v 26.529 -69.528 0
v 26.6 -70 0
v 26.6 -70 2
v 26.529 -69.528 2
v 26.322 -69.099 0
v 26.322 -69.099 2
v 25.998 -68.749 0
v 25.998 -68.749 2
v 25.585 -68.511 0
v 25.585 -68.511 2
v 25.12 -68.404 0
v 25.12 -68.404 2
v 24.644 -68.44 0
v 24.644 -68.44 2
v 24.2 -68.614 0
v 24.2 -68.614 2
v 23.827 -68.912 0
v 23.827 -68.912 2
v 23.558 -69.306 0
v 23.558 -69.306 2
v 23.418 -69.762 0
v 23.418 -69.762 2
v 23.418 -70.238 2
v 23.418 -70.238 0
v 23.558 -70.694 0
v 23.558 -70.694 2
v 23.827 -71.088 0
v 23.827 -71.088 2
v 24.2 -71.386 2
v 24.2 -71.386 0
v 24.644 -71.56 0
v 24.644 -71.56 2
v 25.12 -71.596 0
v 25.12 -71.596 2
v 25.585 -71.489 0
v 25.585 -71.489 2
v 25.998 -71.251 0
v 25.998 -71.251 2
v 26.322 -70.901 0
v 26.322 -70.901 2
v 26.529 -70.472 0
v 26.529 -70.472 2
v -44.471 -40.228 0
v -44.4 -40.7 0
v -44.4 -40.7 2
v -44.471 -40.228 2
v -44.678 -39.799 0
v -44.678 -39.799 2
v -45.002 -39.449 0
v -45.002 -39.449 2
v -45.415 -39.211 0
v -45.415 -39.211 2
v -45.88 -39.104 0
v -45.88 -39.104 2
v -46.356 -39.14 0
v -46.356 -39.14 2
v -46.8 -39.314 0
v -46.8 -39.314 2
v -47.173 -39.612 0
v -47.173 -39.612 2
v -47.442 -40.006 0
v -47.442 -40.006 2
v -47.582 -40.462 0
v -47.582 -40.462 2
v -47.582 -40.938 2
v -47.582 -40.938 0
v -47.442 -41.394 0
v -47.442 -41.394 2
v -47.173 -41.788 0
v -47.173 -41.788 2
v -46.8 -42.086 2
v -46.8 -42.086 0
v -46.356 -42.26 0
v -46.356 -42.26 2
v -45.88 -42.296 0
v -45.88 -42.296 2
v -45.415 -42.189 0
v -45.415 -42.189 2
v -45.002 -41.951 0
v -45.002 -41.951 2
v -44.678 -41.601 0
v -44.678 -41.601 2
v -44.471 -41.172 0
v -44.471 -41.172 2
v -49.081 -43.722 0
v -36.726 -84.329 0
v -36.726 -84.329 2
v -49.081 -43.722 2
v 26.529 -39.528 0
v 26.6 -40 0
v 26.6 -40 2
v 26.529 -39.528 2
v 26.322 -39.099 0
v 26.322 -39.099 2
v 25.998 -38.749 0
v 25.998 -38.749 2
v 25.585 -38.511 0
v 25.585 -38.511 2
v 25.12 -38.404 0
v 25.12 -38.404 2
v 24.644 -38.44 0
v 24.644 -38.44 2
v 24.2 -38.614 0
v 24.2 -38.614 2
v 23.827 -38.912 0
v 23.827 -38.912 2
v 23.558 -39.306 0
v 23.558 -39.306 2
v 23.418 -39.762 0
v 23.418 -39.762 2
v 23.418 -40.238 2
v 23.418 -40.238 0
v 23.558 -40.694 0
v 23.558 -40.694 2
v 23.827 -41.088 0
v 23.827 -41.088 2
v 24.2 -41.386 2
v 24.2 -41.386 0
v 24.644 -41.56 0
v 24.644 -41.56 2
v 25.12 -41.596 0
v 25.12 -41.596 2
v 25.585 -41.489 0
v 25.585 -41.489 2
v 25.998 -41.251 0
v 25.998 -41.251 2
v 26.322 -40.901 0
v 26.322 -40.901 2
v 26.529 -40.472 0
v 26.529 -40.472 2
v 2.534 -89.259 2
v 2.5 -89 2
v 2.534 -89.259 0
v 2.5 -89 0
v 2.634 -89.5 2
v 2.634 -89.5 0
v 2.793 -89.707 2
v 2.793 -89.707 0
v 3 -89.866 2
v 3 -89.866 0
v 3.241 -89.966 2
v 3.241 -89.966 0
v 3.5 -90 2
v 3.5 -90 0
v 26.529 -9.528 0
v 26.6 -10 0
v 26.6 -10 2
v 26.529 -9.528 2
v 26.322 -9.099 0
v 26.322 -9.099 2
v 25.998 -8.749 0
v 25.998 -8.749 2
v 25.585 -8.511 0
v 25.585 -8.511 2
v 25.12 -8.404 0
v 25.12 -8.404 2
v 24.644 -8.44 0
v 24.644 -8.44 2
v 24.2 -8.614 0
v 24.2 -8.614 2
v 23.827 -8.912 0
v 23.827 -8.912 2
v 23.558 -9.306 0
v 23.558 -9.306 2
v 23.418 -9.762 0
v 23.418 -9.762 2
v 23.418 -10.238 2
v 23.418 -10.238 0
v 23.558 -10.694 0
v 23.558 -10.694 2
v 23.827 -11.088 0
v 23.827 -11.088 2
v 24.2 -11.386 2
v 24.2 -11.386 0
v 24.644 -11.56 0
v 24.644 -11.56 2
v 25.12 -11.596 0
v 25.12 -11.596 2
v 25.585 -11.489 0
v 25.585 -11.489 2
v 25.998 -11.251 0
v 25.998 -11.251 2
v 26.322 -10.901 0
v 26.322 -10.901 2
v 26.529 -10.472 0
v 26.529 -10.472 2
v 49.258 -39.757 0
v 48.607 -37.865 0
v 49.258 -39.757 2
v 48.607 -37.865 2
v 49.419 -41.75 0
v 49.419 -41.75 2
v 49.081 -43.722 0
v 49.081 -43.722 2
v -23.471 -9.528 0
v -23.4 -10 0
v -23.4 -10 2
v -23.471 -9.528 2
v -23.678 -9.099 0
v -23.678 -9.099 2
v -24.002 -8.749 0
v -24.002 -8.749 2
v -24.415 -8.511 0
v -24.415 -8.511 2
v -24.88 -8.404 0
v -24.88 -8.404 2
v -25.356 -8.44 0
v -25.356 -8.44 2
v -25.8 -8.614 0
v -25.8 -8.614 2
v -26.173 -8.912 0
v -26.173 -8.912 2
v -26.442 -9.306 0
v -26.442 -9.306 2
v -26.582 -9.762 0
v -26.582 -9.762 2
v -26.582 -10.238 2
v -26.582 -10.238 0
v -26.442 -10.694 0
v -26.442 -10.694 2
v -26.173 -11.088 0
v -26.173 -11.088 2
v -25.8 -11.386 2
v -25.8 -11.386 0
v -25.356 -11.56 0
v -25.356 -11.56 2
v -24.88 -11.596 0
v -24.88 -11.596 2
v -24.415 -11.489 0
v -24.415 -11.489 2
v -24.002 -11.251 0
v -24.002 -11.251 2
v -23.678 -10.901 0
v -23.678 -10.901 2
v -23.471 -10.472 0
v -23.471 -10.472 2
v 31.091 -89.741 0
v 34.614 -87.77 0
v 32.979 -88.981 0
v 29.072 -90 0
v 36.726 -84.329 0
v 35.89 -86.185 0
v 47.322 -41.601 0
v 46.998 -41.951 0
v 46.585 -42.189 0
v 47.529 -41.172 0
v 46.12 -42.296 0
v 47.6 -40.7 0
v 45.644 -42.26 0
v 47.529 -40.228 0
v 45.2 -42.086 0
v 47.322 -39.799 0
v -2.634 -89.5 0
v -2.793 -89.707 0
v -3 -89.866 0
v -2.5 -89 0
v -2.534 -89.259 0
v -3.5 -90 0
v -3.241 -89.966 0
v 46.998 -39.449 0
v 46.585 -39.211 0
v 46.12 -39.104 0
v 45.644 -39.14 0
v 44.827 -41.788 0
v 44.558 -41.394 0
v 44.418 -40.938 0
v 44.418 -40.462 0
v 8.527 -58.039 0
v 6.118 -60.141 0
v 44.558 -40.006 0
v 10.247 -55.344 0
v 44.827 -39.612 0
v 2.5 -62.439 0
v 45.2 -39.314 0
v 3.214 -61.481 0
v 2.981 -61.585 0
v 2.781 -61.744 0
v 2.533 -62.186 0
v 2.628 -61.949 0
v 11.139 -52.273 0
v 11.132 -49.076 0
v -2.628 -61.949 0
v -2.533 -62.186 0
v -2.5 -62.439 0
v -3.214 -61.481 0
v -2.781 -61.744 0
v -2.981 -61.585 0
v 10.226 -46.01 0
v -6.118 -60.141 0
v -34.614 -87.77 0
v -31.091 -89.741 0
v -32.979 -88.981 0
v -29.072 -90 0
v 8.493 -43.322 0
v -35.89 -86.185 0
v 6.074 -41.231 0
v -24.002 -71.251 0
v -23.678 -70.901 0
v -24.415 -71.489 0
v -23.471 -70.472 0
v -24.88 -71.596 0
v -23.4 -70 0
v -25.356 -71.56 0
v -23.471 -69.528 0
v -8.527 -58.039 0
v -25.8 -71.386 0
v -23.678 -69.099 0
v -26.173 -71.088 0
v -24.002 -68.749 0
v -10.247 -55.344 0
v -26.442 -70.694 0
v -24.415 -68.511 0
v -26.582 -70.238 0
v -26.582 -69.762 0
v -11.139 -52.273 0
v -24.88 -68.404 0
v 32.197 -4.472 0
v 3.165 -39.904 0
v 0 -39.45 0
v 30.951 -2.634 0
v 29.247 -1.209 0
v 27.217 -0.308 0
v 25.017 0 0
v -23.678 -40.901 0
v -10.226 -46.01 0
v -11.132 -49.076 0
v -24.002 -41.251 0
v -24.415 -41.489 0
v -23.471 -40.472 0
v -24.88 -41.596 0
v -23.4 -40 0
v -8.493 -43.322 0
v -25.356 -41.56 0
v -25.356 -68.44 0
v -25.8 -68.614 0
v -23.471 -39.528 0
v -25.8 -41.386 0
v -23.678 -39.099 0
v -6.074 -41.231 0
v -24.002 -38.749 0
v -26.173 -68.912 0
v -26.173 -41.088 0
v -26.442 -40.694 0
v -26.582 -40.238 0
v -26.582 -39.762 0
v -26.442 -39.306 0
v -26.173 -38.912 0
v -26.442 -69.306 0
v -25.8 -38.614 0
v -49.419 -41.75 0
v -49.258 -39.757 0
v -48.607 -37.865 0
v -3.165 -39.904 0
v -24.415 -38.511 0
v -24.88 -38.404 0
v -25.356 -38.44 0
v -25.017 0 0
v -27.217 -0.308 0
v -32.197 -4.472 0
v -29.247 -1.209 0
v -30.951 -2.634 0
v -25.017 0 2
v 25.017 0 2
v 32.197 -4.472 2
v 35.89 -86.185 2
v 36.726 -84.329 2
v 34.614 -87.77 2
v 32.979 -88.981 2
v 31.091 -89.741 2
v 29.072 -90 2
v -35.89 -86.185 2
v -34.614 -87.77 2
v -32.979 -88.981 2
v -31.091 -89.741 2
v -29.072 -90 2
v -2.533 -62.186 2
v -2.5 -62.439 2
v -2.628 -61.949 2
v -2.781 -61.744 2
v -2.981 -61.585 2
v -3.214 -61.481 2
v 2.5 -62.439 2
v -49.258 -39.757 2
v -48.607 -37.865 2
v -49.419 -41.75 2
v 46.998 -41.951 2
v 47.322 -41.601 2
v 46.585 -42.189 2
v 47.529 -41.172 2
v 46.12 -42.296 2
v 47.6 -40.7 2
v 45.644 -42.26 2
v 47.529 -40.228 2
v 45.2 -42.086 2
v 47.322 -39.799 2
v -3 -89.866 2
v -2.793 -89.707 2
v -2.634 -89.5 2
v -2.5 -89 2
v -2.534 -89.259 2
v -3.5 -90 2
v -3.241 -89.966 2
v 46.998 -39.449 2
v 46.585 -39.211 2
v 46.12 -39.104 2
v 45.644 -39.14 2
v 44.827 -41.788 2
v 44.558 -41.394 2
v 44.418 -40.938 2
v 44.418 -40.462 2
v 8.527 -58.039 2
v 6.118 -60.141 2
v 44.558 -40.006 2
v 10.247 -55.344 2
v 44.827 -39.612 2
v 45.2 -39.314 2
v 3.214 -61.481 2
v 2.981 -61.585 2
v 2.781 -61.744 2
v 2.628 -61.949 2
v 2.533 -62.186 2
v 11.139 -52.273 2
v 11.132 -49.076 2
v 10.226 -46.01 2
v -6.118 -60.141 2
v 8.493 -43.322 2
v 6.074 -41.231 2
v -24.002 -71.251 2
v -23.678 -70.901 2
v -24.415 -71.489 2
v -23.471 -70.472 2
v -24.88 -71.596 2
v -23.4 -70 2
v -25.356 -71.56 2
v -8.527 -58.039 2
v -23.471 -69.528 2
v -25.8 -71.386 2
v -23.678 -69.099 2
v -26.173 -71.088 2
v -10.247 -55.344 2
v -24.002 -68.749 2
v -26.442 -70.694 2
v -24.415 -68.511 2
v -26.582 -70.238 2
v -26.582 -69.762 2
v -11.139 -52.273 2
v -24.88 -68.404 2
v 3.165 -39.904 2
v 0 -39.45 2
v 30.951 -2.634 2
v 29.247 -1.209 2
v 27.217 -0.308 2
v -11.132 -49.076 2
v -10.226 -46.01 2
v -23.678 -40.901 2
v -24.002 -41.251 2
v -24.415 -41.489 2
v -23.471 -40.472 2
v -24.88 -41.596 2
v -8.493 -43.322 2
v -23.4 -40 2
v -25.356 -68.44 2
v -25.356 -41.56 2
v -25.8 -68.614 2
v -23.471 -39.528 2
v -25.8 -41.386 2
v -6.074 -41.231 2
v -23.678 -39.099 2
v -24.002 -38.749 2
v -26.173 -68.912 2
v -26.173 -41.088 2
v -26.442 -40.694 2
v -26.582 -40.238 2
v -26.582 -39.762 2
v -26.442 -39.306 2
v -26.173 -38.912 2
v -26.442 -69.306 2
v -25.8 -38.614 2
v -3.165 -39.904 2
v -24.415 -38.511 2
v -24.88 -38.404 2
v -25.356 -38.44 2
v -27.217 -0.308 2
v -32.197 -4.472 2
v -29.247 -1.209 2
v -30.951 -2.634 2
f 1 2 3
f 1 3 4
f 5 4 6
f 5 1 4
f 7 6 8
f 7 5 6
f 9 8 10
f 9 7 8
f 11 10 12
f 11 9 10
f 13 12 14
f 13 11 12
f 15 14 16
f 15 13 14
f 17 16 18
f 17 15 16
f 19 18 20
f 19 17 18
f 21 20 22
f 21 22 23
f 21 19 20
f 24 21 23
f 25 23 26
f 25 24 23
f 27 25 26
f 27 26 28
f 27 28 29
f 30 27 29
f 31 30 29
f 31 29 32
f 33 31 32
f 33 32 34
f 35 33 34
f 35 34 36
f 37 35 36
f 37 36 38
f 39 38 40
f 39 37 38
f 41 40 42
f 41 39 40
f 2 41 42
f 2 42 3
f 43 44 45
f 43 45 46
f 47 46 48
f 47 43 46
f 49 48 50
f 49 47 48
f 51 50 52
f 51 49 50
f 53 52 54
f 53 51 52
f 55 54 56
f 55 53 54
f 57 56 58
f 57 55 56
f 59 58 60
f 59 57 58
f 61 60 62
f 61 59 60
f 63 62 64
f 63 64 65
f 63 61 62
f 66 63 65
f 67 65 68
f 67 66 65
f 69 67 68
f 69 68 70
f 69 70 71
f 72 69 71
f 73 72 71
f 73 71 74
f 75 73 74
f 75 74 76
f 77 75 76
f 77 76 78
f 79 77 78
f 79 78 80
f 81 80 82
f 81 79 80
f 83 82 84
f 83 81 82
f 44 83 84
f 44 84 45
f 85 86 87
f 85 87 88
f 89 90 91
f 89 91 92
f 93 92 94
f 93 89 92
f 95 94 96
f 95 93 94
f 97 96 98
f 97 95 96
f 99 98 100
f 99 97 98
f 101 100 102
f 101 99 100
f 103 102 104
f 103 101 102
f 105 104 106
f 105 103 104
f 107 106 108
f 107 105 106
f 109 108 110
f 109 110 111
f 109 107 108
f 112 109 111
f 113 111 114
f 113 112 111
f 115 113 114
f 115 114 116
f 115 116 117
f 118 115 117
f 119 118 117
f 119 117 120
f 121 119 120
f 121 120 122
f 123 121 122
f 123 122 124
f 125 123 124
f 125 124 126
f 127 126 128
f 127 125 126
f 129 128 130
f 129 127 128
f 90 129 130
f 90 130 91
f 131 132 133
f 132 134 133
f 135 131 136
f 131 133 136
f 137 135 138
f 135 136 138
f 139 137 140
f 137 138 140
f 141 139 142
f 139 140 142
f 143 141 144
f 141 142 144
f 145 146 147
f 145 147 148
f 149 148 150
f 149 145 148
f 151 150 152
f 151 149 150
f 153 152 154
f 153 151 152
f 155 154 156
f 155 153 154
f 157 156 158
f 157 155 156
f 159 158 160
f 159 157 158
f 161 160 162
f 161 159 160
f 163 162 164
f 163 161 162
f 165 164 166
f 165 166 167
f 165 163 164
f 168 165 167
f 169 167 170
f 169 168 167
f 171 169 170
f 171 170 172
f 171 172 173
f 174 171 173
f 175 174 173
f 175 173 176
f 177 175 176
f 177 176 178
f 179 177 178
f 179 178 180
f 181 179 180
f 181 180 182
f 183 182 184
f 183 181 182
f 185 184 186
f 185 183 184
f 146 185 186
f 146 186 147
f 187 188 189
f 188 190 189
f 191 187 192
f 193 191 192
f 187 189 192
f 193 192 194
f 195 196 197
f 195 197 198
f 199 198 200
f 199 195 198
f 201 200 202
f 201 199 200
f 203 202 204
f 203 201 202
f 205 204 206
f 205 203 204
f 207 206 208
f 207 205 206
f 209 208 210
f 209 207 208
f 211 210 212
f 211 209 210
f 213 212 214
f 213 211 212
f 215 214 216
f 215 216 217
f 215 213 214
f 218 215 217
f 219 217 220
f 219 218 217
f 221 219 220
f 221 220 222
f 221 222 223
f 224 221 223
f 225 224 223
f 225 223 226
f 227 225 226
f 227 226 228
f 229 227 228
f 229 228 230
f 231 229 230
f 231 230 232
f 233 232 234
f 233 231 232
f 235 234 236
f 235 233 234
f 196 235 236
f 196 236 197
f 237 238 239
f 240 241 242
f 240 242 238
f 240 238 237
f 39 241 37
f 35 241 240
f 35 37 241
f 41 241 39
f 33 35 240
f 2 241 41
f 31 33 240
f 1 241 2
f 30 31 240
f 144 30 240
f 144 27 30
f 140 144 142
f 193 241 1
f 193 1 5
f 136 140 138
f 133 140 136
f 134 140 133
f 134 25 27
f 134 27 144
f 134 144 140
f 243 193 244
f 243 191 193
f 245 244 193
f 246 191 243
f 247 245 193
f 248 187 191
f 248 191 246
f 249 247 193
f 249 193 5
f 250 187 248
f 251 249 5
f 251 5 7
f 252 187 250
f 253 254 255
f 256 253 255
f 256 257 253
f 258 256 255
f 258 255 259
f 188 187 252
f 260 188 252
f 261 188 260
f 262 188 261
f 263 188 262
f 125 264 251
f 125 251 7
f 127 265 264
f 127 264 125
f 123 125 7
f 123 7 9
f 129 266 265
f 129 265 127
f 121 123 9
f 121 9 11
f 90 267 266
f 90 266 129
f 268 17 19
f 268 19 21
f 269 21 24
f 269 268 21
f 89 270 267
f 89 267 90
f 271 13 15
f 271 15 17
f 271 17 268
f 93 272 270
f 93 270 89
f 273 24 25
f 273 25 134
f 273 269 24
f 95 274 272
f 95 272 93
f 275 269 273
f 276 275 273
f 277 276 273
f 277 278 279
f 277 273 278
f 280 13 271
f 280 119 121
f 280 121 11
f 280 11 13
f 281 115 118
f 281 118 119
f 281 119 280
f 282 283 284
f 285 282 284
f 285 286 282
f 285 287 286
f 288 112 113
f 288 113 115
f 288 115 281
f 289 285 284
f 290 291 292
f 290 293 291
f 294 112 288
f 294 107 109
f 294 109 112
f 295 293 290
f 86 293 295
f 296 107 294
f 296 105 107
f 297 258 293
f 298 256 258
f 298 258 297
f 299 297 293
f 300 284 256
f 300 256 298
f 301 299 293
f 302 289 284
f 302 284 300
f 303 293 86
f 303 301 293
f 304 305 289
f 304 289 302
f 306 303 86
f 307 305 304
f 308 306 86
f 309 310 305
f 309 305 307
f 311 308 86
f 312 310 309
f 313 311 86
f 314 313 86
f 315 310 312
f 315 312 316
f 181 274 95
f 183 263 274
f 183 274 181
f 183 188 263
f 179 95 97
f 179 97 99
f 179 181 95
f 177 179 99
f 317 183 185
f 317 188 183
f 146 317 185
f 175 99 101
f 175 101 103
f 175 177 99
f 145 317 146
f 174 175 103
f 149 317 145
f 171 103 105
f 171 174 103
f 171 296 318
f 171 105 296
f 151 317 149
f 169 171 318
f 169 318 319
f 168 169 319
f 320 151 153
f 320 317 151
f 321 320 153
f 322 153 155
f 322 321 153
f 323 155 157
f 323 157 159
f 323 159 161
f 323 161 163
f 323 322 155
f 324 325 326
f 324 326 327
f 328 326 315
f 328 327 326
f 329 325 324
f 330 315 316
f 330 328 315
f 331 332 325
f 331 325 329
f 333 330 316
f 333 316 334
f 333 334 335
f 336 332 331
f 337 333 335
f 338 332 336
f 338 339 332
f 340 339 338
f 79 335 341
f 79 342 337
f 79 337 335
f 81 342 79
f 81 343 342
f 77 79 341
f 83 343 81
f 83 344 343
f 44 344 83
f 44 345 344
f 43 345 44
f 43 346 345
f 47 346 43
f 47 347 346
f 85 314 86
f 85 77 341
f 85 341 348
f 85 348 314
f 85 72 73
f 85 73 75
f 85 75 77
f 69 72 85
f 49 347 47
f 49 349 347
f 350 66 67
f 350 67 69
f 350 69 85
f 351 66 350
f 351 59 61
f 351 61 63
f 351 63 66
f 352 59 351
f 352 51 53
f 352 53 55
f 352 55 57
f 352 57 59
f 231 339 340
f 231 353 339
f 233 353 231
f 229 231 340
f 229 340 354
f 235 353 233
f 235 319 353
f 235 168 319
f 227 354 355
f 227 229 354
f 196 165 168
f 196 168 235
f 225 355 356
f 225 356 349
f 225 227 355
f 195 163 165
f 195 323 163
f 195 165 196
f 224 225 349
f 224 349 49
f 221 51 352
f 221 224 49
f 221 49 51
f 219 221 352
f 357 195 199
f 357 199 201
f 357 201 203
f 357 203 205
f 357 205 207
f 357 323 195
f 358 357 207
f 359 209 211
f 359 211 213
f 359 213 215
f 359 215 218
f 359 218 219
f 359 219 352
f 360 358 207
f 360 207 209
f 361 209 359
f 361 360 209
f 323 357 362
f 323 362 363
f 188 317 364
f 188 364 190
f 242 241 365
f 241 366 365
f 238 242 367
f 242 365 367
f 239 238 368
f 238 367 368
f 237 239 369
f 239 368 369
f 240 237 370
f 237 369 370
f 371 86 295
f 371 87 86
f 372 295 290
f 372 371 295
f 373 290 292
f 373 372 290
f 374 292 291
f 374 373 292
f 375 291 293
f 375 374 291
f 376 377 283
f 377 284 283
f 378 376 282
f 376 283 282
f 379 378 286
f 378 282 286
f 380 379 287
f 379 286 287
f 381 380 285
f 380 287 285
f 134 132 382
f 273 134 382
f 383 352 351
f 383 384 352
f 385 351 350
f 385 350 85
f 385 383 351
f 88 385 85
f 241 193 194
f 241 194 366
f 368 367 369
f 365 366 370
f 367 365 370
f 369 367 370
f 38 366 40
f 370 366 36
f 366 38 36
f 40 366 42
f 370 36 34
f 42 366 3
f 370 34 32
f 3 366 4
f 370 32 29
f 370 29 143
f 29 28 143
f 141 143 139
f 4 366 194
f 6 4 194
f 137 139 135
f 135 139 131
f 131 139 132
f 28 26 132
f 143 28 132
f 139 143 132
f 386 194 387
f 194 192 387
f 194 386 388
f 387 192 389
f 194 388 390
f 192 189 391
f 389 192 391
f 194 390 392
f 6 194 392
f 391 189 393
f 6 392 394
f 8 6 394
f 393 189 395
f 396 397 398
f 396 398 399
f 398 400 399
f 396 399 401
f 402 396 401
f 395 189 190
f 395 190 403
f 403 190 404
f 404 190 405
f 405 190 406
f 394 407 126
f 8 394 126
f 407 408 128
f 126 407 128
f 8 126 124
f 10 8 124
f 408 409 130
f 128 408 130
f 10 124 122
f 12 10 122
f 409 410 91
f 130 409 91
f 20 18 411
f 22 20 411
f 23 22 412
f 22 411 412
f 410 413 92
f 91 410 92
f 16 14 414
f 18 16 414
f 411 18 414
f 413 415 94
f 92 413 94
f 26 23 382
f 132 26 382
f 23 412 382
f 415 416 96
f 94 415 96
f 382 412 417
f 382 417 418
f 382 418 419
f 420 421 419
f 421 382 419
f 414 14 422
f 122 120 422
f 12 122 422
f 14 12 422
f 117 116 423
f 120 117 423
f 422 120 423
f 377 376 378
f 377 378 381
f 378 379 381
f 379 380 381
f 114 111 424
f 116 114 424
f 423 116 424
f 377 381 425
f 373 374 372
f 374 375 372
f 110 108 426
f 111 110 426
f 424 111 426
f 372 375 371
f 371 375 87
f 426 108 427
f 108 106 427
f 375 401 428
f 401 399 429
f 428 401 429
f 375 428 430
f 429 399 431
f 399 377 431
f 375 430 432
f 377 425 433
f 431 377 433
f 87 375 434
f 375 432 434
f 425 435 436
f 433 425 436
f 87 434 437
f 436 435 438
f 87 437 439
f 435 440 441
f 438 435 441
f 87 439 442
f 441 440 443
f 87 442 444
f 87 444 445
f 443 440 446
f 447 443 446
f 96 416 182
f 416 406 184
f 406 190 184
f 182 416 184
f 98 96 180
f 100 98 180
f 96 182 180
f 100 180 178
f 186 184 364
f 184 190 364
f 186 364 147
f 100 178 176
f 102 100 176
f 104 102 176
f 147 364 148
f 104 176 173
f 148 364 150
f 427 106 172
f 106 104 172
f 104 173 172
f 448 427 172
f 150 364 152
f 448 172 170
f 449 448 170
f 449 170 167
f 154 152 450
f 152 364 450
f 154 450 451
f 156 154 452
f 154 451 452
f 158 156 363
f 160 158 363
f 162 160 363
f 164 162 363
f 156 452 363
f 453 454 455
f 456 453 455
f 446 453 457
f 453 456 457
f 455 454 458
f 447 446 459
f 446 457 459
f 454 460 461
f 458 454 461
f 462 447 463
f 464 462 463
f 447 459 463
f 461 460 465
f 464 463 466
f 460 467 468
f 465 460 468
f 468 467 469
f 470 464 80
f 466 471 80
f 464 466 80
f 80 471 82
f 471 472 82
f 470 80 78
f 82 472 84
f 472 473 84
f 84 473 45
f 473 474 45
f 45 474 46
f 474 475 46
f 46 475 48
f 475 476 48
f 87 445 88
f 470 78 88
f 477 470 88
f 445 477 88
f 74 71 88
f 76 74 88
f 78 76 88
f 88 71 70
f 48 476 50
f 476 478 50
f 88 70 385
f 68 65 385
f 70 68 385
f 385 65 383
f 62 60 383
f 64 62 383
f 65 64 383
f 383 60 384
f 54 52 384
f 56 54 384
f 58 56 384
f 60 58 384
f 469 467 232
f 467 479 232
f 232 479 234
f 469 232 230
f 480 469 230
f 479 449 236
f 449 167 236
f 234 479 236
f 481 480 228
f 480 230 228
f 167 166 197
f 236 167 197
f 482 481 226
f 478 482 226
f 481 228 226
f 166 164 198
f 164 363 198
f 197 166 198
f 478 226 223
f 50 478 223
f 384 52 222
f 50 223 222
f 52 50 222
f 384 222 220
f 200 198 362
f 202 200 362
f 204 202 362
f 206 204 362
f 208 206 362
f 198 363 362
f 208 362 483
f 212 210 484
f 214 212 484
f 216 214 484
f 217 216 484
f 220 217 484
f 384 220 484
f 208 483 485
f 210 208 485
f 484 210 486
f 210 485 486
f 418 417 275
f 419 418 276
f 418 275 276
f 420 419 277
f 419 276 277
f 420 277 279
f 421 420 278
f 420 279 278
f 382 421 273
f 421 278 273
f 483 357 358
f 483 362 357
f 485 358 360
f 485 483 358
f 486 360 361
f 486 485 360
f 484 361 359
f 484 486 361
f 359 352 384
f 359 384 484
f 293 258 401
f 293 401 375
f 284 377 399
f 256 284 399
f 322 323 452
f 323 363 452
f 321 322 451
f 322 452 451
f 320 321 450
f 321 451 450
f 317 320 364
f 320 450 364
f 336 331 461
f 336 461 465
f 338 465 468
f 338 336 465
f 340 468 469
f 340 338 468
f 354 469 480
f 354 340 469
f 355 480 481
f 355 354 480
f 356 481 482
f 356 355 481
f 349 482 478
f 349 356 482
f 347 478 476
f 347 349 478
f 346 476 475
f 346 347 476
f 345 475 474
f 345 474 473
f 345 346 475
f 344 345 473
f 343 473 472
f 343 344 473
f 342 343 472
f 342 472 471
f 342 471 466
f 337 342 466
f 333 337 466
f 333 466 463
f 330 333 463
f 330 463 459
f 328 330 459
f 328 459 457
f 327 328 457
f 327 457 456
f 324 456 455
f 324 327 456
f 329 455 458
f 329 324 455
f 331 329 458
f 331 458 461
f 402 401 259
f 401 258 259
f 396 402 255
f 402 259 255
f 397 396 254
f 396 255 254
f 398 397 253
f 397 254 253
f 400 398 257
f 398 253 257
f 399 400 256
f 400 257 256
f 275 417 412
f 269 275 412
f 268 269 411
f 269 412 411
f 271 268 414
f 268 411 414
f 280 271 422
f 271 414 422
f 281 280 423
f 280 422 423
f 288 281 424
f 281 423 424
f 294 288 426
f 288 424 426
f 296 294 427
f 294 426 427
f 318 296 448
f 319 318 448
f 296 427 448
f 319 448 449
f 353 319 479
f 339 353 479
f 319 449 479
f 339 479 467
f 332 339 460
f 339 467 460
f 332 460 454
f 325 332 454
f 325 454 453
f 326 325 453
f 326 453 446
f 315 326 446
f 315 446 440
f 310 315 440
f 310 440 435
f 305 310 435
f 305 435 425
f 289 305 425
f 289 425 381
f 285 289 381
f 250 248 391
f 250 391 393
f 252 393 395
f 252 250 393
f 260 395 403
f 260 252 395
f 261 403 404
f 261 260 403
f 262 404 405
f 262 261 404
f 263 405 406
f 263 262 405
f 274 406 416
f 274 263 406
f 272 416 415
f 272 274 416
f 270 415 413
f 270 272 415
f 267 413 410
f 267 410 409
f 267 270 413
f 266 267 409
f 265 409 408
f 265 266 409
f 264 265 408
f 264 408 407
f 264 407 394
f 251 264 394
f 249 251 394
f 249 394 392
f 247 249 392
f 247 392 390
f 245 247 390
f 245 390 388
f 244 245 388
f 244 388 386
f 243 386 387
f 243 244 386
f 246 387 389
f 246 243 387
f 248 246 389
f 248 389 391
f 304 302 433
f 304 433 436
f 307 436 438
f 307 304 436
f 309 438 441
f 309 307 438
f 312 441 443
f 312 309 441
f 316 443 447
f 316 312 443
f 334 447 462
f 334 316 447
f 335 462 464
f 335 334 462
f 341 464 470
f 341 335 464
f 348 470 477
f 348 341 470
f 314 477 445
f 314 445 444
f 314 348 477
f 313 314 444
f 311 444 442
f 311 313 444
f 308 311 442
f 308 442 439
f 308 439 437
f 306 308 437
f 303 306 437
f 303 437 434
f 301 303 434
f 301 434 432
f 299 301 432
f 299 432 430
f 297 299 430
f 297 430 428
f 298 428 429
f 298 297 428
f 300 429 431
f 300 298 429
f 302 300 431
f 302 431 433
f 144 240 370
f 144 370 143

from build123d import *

# Parameters (mm, degrees)
SKETCH_1_R          = 1.6
EXTRUDE_1_DEPTH     = 2
FILLET_1_R          = 8
CUT_EXTRUDE_1_DEPTH = 10
FILLET_2_R          = 1


with BuildPart() as part:
    # 草图1 → 凸台-拉伸1 (new body)
    with BuildSketch(Plane.XY):
        Polygon((-30, 0), (30, 0), (50, -40.7), (35, -90), (-35, -90), (-50, -40.7), align=None)
        with Locations((-25, -10)):
            Circle(SKETCH_1_R, mode=Mode.SUBTRACT)
        with Locations((-46, -40.7)):
            Circle(SKETCH_1_R, mode=Mode.SUBTRACT)
        with Locations((25, -10)):
            Circle(SKETCH_1_R, mode=Mode.SUBTRACT)
        with Locations((46, -40.7)):
            Circle(SKETCH_1_R, mode=Mode.SUBTRACT)
        with Locations((-25, -40)):
            Circle(SKETCH_1_R, mode=Mode.SUBTRACT)
        with Locations((25, -40)):
            Circle(SKETCH_1_R, mode=Mode.SUBTRACT)
        with Locations((-25, -70)):
            Circle(SKETCH_1_R, mode=Mode.SUBTRACT)
        with Locations((25, -70)):
            Circle(SKETCH_1_R, mode=Mode.SUBTRACT)
    extrude(amount=EXTRUDE_1_DEPTH)

    # 圆角1
    fillet_1_edges = [part.edges().sort_by_distance(p)[0] for p in [
        (50, -40.7, 1),
        (35, -90, 1),
        (-35, -90, 1),
        (-50, -40.7, 1),
        (-30, 0, 1),
        (30, 0, 1),
    ]]
    fillet(fillet_1_edges, radius=FILLET_1_R)

    # 草图2 → 切除-拉伸1 (cut)
    with BuildSketch(Plane.XY.offset(2)):
        with BuildLine():
            Line((-2.5, -61.668705484), (-2.5, -90))
            Line((-2.5, -90), (2.5, -90))
            Line((2.5, -90), (2.5, -61.668705484))
            ThreePointArc((2.5, -61.668705484), (0, -39.45), (-2.5, -61.668705484))
        make_face()
    extrude(amount=-CUT_EXTRUDE_1_DEPTH, mode=Mode.SUBTRACT)

    # 圆角2
    fillet_2_edges = [part.edges().sort_by_distance(p)[0] for p in [
        (2.5, -61.668705484, 1),
        (-2.5, -61.668705484, 1),
        (-2.5, -90, 1),
        (2.5, -90, 1),
    ]]
    fillet(fillet_2_edges, radius=FILLET_2_R)


solid = part.part
